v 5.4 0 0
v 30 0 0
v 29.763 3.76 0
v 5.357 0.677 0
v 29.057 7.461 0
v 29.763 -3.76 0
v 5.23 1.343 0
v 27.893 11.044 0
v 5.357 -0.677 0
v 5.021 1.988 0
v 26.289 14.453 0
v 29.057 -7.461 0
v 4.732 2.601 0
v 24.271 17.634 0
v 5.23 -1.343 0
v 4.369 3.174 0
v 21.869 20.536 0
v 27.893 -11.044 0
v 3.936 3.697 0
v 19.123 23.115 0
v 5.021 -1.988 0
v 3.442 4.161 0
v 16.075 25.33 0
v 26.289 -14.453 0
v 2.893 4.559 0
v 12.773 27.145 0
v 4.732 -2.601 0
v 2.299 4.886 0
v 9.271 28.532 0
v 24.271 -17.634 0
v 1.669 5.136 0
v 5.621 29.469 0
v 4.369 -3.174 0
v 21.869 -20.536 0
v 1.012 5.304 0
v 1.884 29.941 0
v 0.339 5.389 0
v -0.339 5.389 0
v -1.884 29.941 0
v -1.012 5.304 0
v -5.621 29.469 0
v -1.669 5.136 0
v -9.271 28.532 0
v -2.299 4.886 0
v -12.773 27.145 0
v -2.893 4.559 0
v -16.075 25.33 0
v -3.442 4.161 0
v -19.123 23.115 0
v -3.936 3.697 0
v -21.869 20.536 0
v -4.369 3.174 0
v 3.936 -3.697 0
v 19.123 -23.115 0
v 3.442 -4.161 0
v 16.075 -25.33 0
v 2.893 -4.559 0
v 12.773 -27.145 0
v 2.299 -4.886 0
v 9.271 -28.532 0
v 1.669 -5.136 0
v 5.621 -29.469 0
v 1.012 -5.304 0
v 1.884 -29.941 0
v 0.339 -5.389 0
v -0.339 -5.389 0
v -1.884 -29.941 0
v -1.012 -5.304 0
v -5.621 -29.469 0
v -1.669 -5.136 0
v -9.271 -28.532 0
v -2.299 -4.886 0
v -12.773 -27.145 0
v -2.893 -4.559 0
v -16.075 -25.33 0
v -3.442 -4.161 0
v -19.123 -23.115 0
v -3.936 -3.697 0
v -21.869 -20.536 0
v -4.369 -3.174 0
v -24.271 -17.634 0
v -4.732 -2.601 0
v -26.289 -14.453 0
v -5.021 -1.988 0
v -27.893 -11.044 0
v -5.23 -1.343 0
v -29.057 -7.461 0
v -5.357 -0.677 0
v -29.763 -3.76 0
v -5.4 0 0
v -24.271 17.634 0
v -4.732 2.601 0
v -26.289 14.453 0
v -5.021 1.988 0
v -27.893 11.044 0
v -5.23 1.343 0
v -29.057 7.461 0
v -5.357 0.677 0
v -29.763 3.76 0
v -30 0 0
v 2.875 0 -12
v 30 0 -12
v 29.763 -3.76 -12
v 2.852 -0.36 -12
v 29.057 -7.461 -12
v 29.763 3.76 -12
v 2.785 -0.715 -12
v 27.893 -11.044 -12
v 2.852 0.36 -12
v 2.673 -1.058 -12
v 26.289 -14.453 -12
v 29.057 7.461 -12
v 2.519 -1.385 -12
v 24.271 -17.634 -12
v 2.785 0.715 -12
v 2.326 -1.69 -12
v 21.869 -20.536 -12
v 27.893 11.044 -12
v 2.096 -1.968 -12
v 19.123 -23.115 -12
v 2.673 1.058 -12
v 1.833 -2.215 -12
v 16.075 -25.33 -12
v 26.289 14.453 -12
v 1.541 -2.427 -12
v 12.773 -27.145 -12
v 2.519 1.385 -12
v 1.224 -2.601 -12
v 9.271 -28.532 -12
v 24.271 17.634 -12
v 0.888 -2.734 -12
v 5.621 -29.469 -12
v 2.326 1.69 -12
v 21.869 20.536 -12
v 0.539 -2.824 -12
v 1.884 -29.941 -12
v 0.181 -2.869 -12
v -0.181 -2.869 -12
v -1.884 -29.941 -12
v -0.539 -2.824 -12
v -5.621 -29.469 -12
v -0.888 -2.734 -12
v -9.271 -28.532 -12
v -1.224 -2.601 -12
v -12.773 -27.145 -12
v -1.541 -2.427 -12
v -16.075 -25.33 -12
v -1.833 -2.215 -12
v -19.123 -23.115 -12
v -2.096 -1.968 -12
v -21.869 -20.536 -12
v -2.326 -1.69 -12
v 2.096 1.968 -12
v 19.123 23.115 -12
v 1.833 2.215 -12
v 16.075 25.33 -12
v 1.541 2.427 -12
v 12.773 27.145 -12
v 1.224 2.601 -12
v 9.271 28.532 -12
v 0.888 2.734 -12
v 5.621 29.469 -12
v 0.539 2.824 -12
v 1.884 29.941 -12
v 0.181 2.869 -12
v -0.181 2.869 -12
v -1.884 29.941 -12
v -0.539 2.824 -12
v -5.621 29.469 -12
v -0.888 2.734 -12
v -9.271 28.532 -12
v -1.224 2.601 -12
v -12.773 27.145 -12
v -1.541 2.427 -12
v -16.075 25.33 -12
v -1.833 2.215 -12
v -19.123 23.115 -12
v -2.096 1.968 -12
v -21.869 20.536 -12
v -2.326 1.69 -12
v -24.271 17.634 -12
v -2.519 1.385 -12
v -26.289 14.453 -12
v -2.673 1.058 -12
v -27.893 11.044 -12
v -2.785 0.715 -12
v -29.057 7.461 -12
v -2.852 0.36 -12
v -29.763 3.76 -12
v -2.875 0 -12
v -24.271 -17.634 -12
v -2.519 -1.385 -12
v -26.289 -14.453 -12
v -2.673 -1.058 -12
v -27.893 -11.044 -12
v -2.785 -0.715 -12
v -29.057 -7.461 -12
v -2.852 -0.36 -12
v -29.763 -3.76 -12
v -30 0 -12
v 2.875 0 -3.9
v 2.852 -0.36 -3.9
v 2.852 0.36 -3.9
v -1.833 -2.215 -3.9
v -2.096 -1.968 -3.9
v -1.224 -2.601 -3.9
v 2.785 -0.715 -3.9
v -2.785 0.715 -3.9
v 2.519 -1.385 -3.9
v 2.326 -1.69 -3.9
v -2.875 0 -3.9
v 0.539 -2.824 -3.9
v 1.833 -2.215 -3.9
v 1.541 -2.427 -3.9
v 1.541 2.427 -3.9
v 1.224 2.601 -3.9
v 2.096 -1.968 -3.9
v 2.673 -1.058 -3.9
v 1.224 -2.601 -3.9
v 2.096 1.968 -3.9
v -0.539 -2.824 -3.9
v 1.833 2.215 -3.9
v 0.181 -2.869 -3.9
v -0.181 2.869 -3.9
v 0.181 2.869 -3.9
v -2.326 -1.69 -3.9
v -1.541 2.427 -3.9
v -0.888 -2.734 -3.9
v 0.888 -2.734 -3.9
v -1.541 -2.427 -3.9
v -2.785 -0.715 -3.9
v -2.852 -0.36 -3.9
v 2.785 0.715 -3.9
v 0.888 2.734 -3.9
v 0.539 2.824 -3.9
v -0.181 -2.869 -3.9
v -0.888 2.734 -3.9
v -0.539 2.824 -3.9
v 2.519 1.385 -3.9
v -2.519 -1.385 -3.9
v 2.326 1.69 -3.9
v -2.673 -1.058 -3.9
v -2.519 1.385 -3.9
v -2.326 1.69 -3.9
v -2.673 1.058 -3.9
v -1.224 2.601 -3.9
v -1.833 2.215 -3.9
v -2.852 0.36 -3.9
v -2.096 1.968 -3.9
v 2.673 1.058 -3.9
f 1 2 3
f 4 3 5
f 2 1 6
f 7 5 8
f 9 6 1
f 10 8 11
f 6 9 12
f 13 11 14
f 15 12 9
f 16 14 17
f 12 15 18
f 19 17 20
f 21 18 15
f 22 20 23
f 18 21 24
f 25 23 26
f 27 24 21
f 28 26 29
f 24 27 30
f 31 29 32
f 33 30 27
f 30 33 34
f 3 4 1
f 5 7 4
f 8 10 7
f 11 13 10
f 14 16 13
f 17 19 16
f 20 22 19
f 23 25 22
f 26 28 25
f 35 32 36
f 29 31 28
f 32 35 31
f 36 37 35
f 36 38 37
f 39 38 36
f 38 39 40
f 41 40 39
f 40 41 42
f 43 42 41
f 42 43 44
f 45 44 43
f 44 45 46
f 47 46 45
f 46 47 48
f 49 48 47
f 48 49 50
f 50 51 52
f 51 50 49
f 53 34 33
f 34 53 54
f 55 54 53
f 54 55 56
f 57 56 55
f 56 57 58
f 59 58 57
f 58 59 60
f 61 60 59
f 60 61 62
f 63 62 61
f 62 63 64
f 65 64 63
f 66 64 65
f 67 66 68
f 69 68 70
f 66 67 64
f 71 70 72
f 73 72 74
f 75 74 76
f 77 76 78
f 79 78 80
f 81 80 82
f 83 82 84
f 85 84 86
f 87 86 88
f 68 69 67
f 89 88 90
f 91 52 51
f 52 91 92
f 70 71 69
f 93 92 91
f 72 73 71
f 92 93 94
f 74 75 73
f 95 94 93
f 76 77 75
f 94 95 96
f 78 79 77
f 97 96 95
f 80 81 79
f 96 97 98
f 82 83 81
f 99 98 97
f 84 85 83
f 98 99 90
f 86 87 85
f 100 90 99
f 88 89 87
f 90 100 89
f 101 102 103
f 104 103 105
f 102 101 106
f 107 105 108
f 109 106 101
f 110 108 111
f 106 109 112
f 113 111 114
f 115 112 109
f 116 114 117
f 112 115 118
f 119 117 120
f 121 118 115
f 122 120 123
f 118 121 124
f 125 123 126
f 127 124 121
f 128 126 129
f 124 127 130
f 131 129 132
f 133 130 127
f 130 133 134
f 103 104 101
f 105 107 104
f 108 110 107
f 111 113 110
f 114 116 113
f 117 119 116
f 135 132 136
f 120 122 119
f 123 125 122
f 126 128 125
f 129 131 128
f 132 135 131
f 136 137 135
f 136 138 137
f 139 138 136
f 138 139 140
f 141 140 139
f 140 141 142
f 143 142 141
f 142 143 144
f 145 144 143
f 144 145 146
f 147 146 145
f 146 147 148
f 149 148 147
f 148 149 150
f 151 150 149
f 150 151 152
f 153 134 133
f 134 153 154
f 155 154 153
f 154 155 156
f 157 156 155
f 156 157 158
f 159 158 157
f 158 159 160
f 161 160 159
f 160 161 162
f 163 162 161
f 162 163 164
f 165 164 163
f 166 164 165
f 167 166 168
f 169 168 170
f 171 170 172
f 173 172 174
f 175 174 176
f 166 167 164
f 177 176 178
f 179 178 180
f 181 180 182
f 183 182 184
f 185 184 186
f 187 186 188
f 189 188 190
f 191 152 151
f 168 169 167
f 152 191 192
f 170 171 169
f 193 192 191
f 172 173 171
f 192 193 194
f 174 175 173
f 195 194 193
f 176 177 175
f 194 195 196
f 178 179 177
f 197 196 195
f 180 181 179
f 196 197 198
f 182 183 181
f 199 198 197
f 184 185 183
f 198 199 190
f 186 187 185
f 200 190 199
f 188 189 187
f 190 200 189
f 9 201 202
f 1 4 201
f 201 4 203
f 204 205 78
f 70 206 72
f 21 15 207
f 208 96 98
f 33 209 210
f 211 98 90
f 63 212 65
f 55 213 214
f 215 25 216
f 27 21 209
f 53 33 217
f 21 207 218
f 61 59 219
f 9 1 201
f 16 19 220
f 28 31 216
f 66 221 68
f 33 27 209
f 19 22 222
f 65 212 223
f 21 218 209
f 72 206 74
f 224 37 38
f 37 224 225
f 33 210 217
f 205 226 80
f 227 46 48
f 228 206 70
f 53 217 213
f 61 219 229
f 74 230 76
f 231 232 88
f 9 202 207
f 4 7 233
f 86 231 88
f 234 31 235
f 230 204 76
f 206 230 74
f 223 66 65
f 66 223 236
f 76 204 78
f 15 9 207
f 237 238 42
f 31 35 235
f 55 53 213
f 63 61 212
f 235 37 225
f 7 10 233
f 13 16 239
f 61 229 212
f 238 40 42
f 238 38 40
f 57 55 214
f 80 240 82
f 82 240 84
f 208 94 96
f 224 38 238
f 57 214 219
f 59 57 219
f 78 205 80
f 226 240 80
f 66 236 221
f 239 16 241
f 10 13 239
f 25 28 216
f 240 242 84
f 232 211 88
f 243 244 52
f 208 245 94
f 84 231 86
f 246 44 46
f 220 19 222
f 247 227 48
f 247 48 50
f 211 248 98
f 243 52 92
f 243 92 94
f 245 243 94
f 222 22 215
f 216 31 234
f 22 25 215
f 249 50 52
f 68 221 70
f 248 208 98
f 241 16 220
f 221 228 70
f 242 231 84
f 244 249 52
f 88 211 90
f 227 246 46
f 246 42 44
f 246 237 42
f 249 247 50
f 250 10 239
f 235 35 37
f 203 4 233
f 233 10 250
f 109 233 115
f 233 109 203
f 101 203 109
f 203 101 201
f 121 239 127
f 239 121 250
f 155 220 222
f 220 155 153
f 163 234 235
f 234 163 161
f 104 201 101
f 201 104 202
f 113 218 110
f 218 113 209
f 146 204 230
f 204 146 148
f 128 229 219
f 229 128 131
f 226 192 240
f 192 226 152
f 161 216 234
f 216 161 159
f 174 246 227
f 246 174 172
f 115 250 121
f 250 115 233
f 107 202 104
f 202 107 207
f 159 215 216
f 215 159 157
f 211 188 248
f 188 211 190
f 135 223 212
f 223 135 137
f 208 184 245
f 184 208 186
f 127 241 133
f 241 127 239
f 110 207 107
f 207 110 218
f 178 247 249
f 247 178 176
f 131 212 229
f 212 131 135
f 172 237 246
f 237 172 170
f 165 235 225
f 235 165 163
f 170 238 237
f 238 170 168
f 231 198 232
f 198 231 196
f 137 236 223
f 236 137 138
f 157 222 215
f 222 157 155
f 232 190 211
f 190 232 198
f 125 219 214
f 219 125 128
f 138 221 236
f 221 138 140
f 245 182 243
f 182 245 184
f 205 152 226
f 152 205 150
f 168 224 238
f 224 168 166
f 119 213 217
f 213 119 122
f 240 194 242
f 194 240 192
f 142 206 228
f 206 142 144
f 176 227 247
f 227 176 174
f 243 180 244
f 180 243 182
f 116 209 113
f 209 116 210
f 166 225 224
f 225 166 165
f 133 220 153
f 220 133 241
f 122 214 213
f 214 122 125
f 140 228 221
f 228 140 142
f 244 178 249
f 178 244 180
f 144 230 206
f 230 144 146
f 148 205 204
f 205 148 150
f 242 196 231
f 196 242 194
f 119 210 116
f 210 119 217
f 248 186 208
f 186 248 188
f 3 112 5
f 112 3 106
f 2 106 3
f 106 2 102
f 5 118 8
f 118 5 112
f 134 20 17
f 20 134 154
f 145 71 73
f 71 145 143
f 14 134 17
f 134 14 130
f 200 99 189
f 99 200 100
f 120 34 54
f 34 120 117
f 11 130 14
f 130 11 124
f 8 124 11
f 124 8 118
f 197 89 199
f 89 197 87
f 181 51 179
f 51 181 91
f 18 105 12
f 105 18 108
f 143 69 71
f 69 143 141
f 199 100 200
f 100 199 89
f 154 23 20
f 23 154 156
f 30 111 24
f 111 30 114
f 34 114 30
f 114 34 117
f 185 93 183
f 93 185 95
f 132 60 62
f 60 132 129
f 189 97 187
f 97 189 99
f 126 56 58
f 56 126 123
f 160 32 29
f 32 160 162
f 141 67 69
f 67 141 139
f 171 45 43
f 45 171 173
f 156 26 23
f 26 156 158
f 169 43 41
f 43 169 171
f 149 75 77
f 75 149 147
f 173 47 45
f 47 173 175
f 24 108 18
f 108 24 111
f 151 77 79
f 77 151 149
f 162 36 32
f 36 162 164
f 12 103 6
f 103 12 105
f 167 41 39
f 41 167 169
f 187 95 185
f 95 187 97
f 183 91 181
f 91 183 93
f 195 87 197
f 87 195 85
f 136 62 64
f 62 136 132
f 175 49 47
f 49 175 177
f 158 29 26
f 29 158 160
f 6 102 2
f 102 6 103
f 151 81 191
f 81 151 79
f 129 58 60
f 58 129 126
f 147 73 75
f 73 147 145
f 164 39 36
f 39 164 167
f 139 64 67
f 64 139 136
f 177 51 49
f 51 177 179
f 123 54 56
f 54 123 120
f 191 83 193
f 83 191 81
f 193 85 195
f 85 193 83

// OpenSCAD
$fn = 50;


difference() {
	union() {
		translate(v = [0, 0, -12.0000000000]) {
			cylinder(h = 12, r = 30.0000000000);
		}
	}
	union() {
		translate(v = [0, 0, 0]) {
			rotate(a = [0, 0, 0]) {
				difference() {
					union() {
						translate(v = [0, 0, -12.0000000000]) {
							cylinder(h = 12, r = 2.6000000000);
						}
						translate(v = [0, 0, -3.9000000000]) {
							cylinder(h = 3.9000000000, r1 = 2.8750000000, r2 = 5.4000000000);
						}
						translate(v = [0, 0, -12.0000000000]) {
							cylinder(h = 12, r = 2.8750000000);
						}
						translate(v = [0, 0, -12.0000000000]) {
							cylinder(h = 12, r = 2.6000000000);
						}
					}
					union();
				}
			}
		}
	}
}
